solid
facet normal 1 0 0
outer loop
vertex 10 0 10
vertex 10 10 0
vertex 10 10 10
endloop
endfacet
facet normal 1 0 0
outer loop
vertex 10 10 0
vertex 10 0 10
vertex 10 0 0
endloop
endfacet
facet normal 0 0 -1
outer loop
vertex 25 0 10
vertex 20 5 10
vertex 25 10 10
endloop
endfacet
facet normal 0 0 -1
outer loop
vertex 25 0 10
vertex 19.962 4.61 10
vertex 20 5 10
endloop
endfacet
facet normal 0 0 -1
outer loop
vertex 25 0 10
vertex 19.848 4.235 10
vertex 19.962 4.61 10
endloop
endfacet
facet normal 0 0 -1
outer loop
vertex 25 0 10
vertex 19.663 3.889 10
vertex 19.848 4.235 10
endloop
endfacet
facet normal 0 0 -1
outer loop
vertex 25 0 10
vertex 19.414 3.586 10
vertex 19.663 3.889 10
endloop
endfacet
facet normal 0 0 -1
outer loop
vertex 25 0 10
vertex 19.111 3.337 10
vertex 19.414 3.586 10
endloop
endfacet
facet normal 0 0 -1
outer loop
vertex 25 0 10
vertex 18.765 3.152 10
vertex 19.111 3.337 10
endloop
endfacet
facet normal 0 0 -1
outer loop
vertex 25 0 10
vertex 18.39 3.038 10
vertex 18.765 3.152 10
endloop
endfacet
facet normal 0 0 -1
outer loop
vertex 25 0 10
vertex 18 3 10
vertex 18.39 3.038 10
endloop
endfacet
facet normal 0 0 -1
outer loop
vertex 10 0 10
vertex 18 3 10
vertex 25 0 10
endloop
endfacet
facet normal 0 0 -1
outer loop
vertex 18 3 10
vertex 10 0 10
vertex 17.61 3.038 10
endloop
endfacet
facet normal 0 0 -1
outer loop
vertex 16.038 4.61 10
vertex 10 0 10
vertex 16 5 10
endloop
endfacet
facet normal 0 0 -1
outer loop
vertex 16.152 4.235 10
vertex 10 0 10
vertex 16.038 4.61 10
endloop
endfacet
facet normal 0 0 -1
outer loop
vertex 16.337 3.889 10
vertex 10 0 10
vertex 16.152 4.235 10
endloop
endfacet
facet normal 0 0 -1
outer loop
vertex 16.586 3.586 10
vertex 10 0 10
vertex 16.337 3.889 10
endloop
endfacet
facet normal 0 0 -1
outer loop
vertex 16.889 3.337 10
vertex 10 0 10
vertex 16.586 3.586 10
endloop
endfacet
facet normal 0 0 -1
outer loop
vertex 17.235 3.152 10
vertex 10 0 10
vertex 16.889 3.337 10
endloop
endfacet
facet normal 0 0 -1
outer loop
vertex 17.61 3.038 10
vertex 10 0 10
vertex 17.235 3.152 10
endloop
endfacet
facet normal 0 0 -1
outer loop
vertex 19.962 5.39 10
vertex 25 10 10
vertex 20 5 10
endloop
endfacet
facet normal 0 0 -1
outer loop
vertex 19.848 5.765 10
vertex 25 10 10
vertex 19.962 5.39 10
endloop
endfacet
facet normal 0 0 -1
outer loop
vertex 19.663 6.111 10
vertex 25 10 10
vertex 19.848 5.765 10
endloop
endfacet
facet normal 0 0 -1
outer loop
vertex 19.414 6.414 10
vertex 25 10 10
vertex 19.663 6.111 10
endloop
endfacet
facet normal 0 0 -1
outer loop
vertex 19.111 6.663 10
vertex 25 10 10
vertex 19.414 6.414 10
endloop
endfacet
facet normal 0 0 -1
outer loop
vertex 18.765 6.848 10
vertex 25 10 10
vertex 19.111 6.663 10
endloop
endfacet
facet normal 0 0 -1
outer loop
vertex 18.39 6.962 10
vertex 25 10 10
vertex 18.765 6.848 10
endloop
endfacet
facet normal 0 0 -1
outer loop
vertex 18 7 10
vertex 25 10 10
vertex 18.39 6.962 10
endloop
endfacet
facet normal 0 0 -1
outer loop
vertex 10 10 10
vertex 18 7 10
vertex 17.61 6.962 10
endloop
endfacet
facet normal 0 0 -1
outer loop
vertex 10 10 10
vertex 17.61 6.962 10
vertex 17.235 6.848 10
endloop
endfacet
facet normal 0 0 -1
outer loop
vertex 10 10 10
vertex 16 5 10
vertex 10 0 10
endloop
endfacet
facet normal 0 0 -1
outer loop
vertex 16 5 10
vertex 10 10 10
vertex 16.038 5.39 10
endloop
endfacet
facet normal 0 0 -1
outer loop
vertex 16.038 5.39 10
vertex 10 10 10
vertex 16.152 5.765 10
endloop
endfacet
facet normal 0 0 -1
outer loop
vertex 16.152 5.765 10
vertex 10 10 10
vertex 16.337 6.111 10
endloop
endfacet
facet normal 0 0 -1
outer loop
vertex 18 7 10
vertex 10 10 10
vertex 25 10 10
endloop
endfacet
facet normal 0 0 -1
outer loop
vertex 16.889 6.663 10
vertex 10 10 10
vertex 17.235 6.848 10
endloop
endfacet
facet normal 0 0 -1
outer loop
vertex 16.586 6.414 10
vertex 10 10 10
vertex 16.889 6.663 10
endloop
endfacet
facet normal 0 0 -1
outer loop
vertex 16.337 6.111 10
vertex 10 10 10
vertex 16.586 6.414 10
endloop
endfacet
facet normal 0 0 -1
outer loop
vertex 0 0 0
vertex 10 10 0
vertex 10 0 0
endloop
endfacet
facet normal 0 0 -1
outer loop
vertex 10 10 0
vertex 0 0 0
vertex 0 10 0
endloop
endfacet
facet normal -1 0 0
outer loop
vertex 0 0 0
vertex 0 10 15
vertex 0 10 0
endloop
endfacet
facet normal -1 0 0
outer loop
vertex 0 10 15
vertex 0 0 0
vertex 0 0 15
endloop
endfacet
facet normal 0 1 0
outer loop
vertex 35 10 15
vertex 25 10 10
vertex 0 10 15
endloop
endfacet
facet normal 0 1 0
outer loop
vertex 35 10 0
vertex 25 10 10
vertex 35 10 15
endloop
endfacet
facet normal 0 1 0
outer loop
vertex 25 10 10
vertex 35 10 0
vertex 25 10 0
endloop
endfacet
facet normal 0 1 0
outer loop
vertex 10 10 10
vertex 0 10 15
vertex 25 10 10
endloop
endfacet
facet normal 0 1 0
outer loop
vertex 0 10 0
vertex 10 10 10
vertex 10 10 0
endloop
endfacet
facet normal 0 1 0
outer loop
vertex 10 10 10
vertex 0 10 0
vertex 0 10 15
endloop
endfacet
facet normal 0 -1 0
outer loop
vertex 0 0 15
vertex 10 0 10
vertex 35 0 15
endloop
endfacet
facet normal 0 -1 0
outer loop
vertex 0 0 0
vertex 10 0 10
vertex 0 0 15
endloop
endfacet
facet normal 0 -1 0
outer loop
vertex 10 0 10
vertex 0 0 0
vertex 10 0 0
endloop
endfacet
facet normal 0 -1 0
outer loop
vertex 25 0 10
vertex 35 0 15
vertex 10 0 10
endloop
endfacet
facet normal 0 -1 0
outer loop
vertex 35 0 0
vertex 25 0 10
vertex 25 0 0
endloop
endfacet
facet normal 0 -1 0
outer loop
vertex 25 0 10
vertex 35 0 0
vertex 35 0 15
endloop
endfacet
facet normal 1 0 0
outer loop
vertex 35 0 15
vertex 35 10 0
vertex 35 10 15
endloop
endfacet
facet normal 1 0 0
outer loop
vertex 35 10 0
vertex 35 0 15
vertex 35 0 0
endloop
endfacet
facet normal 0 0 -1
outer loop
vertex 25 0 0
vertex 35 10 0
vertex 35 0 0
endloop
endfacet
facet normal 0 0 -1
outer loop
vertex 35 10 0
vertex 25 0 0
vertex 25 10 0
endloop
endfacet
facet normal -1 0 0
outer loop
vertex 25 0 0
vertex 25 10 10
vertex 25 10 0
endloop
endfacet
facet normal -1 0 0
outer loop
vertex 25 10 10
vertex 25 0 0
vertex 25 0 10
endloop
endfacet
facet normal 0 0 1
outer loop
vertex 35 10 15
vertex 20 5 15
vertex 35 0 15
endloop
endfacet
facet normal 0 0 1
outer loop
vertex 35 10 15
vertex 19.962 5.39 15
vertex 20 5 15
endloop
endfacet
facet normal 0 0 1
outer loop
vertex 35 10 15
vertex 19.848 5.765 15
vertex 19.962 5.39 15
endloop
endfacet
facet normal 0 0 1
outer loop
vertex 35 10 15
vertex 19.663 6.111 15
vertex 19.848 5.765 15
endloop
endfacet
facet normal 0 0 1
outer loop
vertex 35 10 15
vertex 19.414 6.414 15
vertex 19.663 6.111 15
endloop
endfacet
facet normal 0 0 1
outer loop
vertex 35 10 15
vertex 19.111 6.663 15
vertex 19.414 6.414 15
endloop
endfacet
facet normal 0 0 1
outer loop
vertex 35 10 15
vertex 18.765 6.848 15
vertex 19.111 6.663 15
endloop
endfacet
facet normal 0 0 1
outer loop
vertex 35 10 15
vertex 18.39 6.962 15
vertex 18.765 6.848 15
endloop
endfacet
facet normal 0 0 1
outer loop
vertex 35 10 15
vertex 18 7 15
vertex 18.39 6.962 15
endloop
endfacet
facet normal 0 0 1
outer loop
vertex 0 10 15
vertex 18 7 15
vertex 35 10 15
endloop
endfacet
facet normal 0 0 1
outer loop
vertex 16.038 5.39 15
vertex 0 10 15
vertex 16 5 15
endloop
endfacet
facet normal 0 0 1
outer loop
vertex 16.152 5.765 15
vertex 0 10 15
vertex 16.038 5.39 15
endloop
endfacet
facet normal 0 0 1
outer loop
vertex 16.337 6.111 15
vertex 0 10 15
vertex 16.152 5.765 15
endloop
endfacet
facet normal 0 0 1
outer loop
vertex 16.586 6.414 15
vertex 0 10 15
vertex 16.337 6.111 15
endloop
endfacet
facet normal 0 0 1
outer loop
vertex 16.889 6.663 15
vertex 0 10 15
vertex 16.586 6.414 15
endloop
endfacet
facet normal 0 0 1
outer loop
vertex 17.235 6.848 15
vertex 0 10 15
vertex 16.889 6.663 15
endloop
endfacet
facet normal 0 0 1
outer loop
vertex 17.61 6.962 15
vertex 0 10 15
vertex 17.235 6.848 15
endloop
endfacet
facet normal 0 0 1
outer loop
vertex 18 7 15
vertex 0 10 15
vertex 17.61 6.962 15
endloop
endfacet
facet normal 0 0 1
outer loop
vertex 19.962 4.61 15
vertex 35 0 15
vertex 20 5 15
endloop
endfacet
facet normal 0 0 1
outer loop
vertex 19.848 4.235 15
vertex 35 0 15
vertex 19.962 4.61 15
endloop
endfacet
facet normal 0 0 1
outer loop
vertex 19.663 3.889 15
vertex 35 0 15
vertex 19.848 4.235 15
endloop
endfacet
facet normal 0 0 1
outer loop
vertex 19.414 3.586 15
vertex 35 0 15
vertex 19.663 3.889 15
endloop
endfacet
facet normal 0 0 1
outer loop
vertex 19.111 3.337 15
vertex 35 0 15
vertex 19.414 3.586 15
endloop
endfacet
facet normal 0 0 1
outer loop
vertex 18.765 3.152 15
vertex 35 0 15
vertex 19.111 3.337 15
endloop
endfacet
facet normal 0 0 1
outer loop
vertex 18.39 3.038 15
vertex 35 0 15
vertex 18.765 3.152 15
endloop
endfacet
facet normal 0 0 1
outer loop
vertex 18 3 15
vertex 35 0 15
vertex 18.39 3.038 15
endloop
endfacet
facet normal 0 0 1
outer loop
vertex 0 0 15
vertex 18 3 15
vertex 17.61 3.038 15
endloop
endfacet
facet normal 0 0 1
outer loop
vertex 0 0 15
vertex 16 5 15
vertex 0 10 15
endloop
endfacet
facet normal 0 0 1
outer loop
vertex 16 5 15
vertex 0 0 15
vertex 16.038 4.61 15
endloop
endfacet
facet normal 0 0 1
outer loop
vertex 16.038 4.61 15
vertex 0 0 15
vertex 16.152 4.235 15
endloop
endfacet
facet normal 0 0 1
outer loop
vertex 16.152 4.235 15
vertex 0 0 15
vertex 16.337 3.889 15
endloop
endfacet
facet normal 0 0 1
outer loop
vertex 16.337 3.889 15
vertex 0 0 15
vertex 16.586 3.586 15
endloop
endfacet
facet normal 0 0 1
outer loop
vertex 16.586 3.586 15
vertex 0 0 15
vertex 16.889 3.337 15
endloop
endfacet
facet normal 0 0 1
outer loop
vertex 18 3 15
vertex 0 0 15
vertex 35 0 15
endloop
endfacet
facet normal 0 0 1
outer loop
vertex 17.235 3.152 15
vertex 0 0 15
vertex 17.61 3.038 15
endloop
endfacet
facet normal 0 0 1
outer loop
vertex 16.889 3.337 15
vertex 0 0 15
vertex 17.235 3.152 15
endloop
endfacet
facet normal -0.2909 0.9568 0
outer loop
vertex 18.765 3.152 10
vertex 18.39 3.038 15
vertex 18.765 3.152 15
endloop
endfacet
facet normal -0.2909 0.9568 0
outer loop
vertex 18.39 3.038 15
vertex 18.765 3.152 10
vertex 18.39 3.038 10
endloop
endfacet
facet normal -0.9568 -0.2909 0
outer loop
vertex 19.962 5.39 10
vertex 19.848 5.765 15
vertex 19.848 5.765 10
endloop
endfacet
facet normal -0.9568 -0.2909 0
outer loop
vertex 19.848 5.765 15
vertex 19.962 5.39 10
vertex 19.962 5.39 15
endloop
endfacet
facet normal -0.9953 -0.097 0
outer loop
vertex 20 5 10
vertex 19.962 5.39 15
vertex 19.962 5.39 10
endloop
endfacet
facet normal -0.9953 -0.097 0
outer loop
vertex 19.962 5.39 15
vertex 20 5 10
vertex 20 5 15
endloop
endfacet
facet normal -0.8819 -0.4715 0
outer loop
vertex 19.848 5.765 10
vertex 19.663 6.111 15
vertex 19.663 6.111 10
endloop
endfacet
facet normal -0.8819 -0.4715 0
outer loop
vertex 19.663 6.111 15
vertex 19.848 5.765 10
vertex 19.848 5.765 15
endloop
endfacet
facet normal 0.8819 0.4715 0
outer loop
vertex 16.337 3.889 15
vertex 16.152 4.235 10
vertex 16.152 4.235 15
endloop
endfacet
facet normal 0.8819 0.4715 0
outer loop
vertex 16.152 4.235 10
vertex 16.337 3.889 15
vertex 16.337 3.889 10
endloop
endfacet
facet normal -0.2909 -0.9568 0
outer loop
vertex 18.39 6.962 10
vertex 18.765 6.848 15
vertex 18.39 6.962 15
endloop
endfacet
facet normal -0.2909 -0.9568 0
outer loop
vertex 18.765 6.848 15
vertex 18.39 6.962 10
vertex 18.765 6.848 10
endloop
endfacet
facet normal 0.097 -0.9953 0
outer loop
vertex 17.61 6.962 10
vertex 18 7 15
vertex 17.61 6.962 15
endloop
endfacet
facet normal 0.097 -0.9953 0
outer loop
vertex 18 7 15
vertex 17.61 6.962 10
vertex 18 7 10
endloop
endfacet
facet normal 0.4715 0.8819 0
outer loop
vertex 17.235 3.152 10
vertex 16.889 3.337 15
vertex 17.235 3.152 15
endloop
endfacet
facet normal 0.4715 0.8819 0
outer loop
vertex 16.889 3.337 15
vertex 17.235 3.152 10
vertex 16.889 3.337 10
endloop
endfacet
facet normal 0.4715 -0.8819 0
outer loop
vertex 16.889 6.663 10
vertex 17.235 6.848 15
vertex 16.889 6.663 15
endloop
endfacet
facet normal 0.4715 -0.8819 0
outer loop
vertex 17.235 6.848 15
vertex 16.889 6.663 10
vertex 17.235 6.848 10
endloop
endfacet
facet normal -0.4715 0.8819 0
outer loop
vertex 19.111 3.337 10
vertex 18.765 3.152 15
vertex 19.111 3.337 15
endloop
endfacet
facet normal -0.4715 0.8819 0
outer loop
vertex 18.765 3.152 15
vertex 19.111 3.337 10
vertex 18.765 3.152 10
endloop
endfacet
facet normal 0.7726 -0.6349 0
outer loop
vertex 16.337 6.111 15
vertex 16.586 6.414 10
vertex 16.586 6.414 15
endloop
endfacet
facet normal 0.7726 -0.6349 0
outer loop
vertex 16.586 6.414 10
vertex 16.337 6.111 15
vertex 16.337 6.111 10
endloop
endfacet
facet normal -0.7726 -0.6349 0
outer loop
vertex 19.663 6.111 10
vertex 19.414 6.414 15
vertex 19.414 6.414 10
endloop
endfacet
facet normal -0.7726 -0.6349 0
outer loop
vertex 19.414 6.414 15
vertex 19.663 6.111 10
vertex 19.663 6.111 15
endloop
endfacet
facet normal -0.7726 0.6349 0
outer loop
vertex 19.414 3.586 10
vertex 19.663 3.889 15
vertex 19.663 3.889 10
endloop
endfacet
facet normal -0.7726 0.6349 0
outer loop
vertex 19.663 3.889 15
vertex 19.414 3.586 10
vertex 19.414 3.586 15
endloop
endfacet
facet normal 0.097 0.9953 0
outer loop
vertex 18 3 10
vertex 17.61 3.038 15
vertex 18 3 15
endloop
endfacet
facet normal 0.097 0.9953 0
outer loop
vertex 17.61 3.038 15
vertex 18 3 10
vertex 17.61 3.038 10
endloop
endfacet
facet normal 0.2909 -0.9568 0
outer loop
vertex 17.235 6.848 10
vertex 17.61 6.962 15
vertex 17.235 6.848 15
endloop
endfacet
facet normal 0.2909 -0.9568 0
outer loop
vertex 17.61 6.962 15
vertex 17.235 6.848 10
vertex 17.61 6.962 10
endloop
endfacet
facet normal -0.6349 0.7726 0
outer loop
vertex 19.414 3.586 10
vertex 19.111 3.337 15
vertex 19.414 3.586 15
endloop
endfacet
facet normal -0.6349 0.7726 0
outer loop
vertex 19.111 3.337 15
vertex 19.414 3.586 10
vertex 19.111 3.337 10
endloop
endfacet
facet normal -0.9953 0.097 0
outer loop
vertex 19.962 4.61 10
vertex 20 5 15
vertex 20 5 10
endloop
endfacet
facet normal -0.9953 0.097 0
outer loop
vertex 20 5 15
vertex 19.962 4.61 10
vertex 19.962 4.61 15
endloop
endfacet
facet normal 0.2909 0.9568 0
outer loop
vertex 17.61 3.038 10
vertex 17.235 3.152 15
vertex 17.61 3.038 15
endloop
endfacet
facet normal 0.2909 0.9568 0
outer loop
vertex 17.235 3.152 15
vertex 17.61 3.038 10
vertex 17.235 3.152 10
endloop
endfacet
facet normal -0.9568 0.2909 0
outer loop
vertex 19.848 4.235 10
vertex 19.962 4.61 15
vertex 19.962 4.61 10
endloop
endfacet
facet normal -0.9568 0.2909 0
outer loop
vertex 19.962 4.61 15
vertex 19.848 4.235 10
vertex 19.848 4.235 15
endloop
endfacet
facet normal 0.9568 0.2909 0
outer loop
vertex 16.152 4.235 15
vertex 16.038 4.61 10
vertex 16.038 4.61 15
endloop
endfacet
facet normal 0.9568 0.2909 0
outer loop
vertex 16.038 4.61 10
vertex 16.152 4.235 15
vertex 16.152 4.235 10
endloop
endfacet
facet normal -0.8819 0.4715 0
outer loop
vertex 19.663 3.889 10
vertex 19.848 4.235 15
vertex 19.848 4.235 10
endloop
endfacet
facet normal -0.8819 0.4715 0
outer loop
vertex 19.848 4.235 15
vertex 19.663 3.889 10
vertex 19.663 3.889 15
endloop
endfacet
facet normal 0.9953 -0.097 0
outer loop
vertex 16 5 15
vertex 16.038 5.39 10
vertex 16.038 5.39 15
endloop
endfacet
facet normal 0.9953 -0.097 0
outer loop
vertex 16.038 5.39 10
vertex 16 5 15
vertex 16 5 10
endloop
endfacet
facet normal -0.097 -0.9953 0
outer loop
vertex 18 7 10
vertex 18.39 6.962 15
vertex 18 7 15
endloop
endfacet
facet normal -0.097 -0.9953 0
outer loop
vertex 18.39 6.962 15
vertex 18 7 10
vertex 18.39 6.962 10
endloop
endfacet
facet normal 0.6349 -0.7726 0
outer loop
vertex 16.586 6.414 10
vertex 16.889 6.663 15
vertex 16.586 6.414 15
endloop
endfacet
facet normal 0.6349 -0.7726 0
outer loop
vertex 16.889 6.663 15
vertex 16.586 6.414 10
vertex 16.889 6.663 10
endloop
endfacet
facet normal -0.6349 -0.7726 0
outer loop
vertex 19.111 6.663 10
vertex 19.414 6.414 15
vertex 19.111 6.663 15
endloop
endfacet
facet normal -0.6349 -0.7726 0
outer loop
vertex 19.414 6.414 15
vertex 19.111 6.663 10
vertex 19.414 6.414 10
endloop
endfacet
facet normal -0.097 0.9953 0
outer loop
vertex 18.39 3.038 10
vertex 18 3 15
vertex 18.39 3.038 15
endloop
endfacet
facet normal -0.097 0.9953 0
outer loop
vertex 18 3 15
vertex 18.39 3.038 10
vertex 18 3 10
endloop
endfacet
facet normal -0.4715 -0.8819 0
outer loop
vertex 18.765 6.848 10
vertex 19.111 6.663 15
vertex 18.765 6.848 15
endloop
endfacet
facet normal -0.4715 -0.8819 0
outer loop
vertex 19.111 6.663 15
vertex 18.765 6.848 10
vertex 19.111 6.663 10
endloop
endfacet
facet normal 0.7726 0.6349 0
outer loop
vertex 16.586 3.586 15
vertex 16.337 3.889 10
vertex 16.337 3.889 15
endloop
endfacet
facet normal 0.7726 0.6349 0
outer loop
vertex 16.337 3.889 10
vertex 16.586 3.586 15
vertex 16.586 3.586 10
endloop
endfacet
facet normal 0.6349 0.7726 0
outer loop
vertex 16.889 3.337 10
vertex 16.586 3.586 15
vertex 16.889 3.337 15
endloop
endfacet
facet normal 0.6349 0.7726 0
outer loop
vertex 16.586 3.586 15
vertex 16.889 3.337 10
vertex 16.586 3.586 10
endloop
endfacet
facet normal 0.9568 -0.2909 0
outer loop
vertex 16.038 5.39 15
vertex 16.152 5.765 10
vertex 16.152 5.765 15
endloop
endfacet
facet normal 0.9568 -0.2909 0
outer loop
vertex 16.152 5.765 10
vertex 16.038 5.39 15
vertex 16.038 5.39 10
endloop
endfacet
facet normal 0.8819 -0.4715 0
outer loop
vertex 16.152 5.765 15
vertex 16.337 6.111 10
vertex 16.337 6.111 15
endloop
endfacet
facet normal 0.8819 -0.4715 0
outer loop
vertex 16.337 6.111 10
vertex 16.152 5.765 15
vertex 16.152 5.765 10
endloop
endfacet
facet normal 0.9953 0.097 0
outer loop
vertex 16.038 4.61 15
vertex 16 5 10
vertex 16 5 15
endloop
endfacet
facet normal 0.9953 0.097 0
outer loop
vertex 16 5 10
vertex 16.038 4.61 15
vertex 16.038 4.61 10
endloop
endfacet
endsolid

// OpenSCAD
$fs = 0.4;
$fa = 1;

difference(){
    union() {
        cube(10);
        translate([25, 0, 0]) cube(10);
        translate([0, 0, 10]) cube([35, 10, 5]);
    }
    translate([18, 5, 5])cylinder(r=2,h=12);
}
